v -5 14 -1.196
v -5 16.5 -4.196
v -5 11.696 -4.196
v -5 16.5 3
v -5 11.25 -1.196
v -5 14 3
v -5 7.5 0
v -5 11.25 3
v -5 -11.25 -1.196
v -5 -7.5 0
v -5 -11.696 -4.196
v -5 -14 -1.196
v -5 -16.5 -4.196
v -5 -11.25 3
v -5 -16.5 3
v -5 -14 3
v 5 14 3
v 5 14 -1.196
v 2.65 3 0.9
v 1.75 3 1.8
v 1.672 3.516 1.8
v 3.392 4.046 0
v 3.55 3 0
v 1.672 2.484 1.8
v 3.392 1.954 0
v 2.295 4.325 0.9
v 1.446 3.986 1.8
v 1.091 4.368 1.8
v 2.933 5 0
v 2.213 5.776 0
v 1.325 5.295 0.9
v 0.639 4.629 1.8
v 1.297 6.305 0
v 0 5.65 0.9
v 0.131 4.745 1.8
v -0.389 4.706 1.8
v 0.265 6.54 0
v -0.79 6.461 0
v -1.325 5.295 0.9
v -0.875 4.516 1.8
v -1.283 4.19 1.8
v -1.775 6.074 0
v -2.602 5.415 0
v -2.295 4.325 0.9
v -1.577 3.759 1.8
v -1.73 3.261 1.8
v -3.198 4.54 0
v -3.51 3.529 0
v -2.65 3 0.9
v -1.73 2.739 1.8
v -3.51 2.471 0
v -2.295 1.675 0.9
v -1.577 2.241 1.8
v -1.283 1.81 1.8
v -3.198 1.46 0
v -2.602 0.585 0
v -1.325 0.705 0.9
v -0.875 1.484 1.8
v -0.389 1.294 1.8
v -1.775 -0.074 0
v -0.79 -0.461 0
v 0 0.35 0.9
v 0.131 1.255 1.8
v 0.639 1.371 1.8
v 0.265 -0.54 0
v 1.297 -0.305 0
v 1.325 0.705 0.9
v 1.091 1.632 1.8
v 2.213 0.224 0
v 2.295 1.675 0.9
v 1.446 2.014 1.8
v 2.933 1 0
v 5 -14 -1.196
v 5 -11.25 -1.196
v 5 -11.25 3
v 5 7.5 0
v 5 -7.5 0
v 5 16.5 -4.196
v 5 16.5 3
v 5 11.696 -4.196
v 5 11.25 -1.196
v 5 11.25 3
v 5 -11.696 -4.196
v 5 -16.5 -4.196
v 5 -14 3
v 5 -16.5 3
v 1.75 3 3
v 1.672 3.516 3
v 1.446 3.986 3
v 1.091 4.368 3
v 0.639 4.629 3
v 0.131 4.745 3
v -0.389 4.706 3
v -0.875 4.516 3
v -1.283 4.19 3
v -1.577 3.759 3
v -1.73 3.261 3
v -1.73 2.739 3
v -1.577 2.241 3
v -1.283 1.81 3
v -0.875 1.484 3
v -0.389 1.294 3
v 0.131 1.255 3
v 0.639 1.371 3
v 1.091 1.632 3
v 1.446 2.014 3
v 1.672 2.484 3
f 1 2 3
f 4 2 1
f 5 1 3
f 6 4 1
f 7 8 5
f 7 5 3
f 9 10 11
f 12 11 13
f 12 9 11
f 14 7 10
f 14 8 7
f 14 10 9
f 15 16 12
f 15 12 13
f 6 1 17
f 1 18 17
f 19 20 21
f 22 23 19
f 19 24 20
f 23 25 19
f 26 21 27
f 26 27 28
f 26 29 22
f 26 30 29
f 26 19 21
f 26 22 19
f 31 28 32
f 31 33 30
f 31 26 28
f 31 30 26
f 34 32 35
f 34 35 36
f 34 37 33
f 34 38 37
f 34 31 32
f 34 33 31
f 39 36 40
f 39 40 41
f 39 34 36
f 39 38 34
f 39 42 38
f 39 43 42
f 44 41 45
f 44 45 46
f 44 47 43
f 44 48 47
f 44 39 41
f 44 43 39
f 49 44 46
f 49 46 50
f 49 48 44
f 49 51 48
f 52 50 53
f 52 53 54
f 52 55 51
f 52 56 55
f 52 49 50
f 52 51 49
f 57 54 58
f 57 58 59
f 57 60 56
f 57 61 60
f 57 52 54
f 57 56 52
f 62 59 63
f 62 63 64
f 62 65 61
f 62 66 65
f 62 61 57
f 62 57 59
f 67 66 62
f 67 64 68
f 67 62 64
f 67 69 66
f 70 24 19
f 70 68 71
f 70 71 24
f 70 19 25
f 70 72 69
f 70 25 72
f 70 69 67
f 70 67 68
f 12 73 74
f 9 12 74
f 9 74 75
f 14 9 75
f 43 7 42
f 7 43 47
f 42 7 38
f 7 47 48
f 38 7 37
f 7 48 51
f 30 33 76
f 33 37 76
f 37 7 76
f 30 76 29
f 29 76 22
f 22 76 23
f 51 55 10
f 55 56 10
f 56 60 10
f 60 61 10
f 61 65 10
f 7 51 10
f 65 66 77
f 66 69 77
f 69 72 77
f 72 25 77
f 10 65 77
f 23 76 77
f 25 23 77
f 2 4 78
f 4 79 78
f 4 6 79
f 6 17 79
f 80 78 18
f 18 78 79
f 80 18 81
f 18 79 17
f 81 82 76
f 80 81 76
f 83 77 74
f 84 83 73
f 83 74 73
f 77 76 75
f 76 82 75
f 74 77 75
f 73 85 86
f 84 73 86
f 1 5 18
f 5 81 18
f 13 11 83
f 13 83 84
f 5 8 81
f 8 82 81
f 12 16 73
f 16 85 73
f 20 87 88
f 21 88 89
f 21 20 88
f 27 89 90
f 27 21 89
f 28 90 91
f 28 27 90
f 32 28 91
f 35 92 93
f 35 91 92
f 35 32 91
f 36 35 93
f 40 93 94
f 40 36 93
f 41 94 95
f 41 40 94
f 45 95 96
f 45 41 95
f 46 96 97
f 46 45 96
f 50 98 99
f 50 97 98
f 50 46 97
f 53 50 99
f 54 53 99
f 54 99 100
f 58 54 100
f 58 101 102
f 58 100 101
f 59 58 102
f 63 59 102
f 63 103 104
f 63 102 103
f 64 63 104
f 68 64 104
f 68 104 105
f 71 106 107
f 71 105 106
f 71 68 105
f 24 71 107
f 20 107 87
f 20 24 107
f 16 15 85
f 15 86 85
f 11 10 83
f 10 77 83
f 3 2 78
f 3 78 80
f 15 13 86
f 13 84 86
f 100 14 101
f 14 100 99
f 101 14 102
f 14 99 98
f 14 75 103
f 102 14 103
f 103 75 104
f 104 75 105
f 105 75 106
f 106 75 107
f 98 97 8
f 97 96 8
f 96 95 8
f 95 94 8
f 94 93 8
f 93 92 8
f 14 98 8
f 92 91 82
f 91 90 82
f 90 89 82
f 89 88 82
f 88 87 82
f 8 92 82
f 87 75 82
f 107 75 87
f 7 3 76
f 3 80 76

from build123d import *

# Parameters (mm, degrees)
PAD_DEPTH    = 5
SKETCH001_R  = 1.75
POCKET_DEPTH = 3.001
CHAMFER_SIZE = 1.8


with BuildPart() as part:
    # Sketch → Pad (new body, symmetric)
    with BuildSketch(Plane.YZ):
        Polygon((-11.25, 3), (11.25, 3), (11.25, -1.196), (14, -1.196), (14, 3), (16.5, 3), (16.5, -4.196), (11.696, -4.196), (7.5, 0), (-7.5, 0), (-11.696, -4.196), (-16.5, -4.196), (-16.5, 3), (-14, 3), (-14, -1.196), (-11.25, -1.196), align=None)
    extrude(amount=PAD_DEPTH, both=True)

    # Sketch001 → Pocket (cut, through all)
    with BuildSketch(Plane.XY):
        with Locations((0, 3)):
            Circle(SKETCH001_R)
    extrude(amount=POCKET_DEPTH, mode=Mode.SUBTRACT)

    # Chamfer
    chamfer_edges = [part.edges().sort_by_distance(p)[0] for p in [
        (-1.75, 3, 0),
    ]]
    chamfer(chamfer_edges, length=CHAMFER_SIZE)


solid = part.part
